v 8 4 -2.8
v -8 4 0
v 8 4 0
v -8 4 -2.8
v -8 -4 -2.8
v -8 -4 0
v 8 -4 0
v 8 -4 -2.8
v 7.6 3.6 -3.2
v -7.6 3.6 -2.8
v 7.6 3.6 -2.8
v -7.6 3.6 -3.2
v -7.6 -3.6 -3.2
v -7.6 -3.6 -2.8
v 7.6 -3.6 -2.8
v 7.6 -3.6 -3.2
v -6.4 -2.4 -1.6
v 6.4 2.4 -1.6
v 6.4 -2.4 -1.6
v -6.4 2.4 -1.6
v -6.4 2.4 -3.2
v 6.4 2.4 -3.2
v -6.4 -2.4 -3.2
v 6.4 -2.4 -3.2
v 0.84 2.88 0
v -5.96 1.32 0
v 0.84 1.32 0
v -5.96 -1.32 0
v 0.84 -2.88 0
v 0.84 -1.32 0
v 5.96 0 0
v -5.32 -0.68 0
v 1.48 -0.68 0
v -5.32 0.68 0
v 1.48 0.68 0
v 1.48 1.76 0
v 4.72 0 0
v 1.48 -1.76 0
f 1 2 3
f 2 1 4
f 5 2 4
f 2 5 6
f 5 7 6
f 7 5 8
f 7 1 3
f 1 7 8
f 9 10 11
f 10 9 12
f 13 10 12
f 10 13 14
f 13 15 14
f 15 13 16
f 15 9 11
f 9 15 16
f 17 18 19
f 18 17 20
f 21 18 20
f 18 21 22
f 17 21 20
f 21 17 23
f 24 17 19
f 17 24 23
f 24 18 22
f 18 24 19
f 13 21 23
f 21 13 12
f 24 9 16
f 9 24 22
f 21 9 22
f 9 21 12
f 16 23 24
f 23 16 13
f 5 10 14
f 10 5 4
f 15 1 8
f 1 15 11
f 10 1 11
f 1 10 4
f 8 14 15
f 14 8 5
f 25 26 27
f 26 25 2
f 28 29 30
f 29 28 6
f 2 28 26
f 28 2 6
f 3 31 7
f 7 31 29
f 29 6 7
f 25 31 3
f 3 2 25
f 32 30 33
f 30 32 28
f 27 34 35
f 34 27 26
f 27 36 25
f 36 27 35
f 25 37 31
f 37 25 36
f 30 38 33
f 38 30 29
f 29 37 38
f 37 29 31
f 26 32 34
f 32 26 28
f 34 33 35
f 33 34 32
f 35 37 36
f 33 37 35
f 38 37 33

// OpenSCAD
// file: ../p/box5.scad
use <../lib.scad>
function ldraw_lib__box5() = [
// 0 Box with 5 Faces and All Edges
// 0 Name: box5.dat
// 0 Author: James Jessiman
// 0 !LDRAW_ORG Primitive UPDATE 2012-01
// 0 !LICENSE Licensed under CC BY 4.0 : see CAreadme.txt
// 
// 0 BFC CERTIFY CCW
  [0,"BFC","CERTIFY"],
  [0,"BFC","CCW"],
// 
// 0 !HISTORY 2002-04-03 [sbliss] Modified for BFC compliance
// 0 !HISTORY 2002-04-25 [PTadmin] Official Update 2002-02
// 0 !HISTORY 2007-06-24 [PTadmin] Header formatted for Contributor Agreement
// 0 !HISTORY 2008-07-01 [PTadmin] Official Update 2008-01
// 0 !HISTORY 2012-02-16 [Philo] Changed to CCW
// 0 !HISTORY 2012-03-30 [PTadmin] Official Update 2012-01
// 
// 
// 2 24 1 1 1 -1 1 1
  [2,24,1,1,1,-1,1,1],
// 2 24 -1 1 1 -1 1 -1
  [2,24,-1,1,1,-1,1,-1],
// 2 24 -1 1 -1 1 1 -1
  [2,24,-1,1,-1,1,1,-1],
// 2 24 1 1 -1 1 1 1
  [2,24,1,1,-1,1,1,1],
// 2 24 1 0 1 -1 0 1
  [2,24,1,0,1,-1,0,1],
// 2 24 -1 0 1 -1 0 -1
  [2,24,-1,0,1,-1,0,-1],
// 2 24 -1 0 -1 1 0 -1
  [2,24,-1,0,-1,1,0,-1],
// 2 24 1 0 -1 1 0 1
  [2,24,1,0,-1,1,0,1],
// 2 24 1 0 1 1 1 1
  [2,24,1,0,1,1,1,1],
// 2 24 -1 0 1 -1 1 1
  [2,24,-1,0,1,-1,1,1],
// 2 24 1 0 -1 1 1 -1
  [2,24,1,0,-1,1,1,-1],
// 2 24 -1 0 -1 -1 1 -1
  [2,24,-1,0,-1,-1,1,-1],
// 4 16 -1 1 1 1 1 1 1 1 -1 -1 1 -1
  [4,16,-1,1,1,1,1,1,1,1,-1,-1,1,-1],
// 4 16 -1 1 1 -1 0 1 1 0 1 1 1 1
  [4,16,-1,1,1,-1,0,1,1,0,1,1,1,1],
// 4 16 -1 1 -1 -1 0 -1 -1 0 1 -1 1 1
  [4,16,-1,1,-1,-1,0,-1,-1,0,1,-1,1,1],
// 4 16 1 1 -1 1 0 -1 -1 0 -1 -1 1 -1
  [4,16,1,1,-1,1,0,-1,-1,0,-1,-1,1,-1],
// 4 16 1 1 1 1 0 1 1 0 -1 1 1 -1
  [4,16,1,1,1,1,0,1,1,0,-1,1,1,-1],
];
module ldraw_lib__box5(step=0, col=false, unit=2/5, alt=false, line=0.2, solid=!$preview)
    makepoly(ldraw_lib__box5(), step=step, col=col, unit=unit, alt=alt, line=line, solid=solid);
ldraw_lib__box5(line=0.2);
// file: ../p/box4.scad
use <../lib.scad>
function ldraw_lib__box4() = [
// 0 Box with 4 Faces (2 Parallel Pairs) and All Edges
// 0 Name: box4.dat
// 0 Author: James Jessiman
// 0 !LDRAW_ORG Primitive UPDATE 2012-01
// 0 !LICENSE Licensed under CC BY 4.0 : see CAreadme.txt
// 
// 0 BFC CERTIFY CCW
  [0,"BFC","CERTIFY"],
  [0,"BFC","CCW"],
// 
// 0 !HISTORY 2002-04-03 [sbliss] Modified for BFC compliance
// 0 !HISTORY 2002-04-25 [PTadmin] Official Update 2002-02
// 0 !HISTORY 2007-06-24 [PTadmin] Header formatted for Contributor Agreement
// 0 !HISTORY 2008-07-01 [PTadmin] Official Update 2008-01
// 0 !HISTORY 2012-02-16 [Philo] Changed to CCW
// 0 !HISTORY 2012-03-30 [PTadmin] Official Update 2012-01
// 
// 
// 2 24 1 1 1 -1 1 1
  [2,24,1,1,1,-1,1,1],
// 2 24 -1 1 1 -1 1 -1
  [2,24,-1,1,1,-1,1,-1],
// 2 24 -1 1 -1 1 1 -1
  [2,24,-1,1,-1,1,1,-1],
// 2 24 1 1 -1 1 1 1
  [2,24,1,1,-1,1,1,1],
// 2 24 1 0 1 -1 0 1
  [2,24,1,0,1,-1,0,1],
// 2 24 -1 0 1 -1 0 -1
  [2,24,-1,0,1,-1,0,-1],
// 2 24 -1 0 -1 1 0 -1
  [2,24,-1,0,-1,1,0,-1],
// 2 24 1 0 -1 1 0 1
  [2,24,1,0,-1,1,0,1],
// 2 24 1 0 1 1 1 1
  [2,24,1,0,1,1,1,1],
// 2 24 -1 0 1 -1 1 1
  [2,24,-1,0,1,-1,1,1],
// 2 24 1 0 -1 1 1 -1
  [2,24,1,0,-1,1,1,-1],
// 2 24 -1 0 -1 -1 1 -1
  [2,24,-1,0,-1,-1,1,-1],
// 4 16 -1 1 1 -1 0 1 1 0 1 1 1 1
  [4,16,-1,1,1,-1,0,1,1,0,1,1,1,1],
// 4 16 -1 1 -1 -1 0 -1 -1 0 1 -1 1 1
  [4,16,-1,1,-1,-1,0,-1,-1,0,1,-1,1,1],
// 4 16 1 1 -1 1 0 -1 -1 0 -1 -1 1 -1
  [4,16,1,1,-1,1,0,-1,-1,0,-1,-1,1,-1],
// 4 16 1 1 1 1 0 1 1 0 -1 1 1 -1
  [4,16,1,1,1,1,0,1,1,0,-1,1,1,-1],
];
module ldraw_lib__box4(step=0, col=false, unit=2/5, alt=false, line=0.2, solid=!$preview)
    makepoly(ldraw_lib__box4(), step=step, col=col, unit=unit, alt=alt, line=line, solid=solid);
ldraw_lib__box4(line=0.2);
// file: s/3069p06c.scad
use <../../lib.scad>
function ldraw_lib__s__3069p06c() = [
// 0 ~Tile  1 x  2 with Arrow Long Pattern (Arrow)
// 0 Name: s\3069p06c.dat
// 0 Author: William Howard [WilliamH]
// 0 !LDRAW_ORG Subpart UPDATE 2009-03
// 0 !LICENSE Licensed under CC BY 2.0 and CC BY 4.0 : see CAreadme.txt
// 
// 0 BFC CERTIFY CCW
  [0,"BFC","CERTIFY"],
  [0,"BFC","CCW"],
// 
// 0 !HISTORY 2009-05-02 [PTadmin] Official Update 2009-01
// 0 !HISTORY 2009-08-18 [anathema] Improved pattern
// 0 !HISTORY 2009-12-29 [PTadmin] Official Update 2009-03
// 
// 
// 4 16 -13.3 0 -1.7 3.7 0 -1.7 3.7 0 1.7 -13.3 0 1.7
  [4,16,-13.3,0,-1.7,3.7,0,-1.7,3.7,0,1.7,-13.3,0,1.7],
// 3 16 3.7 0 1.7 11.8 0 0 3.7 0 4.4
  [3,16,3.7,0,1.7,11.8,0,0,3.7,0,4.4],
// 3 16 3.7 0 -1.7 11.8 0 0 3.7 0 1.7
  [3,16,3.7,0,-1.7,11.8,0,0,3.7,0,1.7],
// 3 16 3.7 0 -4.4 11.8 0 0 3.7 0 -1.7
  [3,16,3.7,0,-4.4,11.8,0,0,3.7,0,-1.7],
// 0
];
module ldraw_lib__s__3069p06c(step=0, col=false, unit=2/5, alt=false, line=0.2, solid=!$preview)
    makepoly(ldraw_lib__s__3069p06c(), step=step, col=col, unit=unit, alt=alt, line=line, solid=solid);
ldraw_lib__s__3069p06c(line=0.2);
// file: s/3069p06b.scad
use <../../lib.scad>
function ldraw_lib__s__3069p06b() = [
// 0 ~Tile  1 x  2 with Arrow Long Pattern (Border)
// 0 Name: s\3069p06b.dat
// 0 Author: William Howard [WilliamH]
// 0 !LDRAW_ORG Subpart UPDATE 2009-03
// 0 !LICENSE Licensed under CC BY 2.0 and CC BY 4.0 : see CAreadme.txt
// 
// 0 BFC CERTIFY CCW
  [0,"BFC","CERTIFY"],
  [0,"BFC","CCW"],
// 
// 0 !HISTORY 2009-05-02 [PTadmin] Official Update 2009-01
// 0 !HISTORY 2009-08-18 [anathema] Improved pattern
// 0 !HISTORY 2009-10-09 [cwdee] Corrected small overlap
// 0 !HISTORY 2009-12-29 [PTadmin] Official Update 2009-03
// 
// 
// 4 16 -14.9 0 -3.3 2.1 0 -3.3 3.7 0 -1.7 -13.3 0 -1.7
  [4,16,-14.9,0,-3.3,2.1,0,-3.3,3.7,0,-1.7,-13.3,0,-1.7],
// 4 16 -13.3 0 1.7 3.7 0 1.7 2.1 0 3.3 -14.9 0 3.3
  [4,16,-13.3,0,1.7,3.7,0,1.7,2.1,0,3.3,-14.9,0,3.3],
// 4 16 2.1 0 7.2 2.1 0 3.3 3.7 0 1.7 3.7 0 4.4
  [4,16,2.1,0,7.2,2.1,0,3.3,3.7,0,1.7,3.7,0,4.4],
// 4 16 3.7 0 4.4 11.8 0 0 14.9 0 0 2.1 0 7.2
  [4,16,3.7,0,4.4,11.8,0,0,14.9,0,0,2.1,0,7.2],
// 4 16 3.7 0 -4.4 3.7 0 -1.7 2.1 0 -3.3 2.1 0 -7.2
  [4,16,3.7,0,-4.4,3.7,0,-1.7,2.1,0,-3.3,2.1,0,-7.2],
// 4 16 2.1 0 -7.2 14.9 0 0 11.8 0 0 3.7 0 -4.4
  [4,16,2.1,0,-7.2,14.9,0,0,11.8,0,0,3.7,0,-4.4],
// 4 16 -14.9 0 3.3 -14.9 0 -3.3 -13.3 0 -1.7 -13.3 0 1.7
  [4,16,-14.9,0,3.3,-14.9,0,-3.3,-13.3,0,-1.7,-13.3,0,1.7],
// 0
];
module ldraw_lib__s__3069p06b(step=0, col=false, unit=2/5, alt=false, line=0.2, solid=!$preview)
    makepoly(ldraw_lib__s__3069p06b(), step=step, col=col, unit=unit, alt=alt, line=line, solid=solid);
ldraw_lib__s__3069p06b(line=0.2);
// file: s/3069p06a.scad
use <../../lib.scad>
function ldraw_lib__s__3069p06a() = [
// 0 ~Tile  1 x  2 with Arrow Long Pattern (Mask)
// 0 Name: s\3069p06a.dat
// 0 Author: William Howard [WilliamH]
// 0 !LDRAW_ORG Subpart UPDATE 2009-03
// 0 !LICENSE Licensed under CC BY 2.0 and CC BY 4.0 : see CAreadme.txt
// 
// 0 BFC CERTIFY CCW
  [0,"BFC","CERTIFY"],
  [0,"BFC","CCW"],
// 
// 0 !HISTORY 2009-05-02 [PTadmin] Official Update 2009-01
// 0 !HISTORY 2009-08-18 [anathema] Improved pattern
// 0 !HISTORY 2009-12-29 [PTadmin] Official Update 2009-03
// 
// 
// 4 16 -14.9 0 3.3 2.1 0 3.3 2.1 0 7.2 -20 0 10
  [4,16,-14.9,0,3.3,2.1,0,3.3,2.1,0,7.2,-20,0,10],
// 4 16 -20 0 -10 2.1 0 -7.2 2.1 0 -3.3 -14.9 0 -3.3
  [4,16,-20,0,-10,2.1,0,-7.2,2.1,0,-3.3,-14.9,0,-3.3],
// 4 16 -20 0 10 -20 0 -10 -14.9 0 -3.3 -14.9 0 3.3
  [4,16,-20,0,10,-20,0,-10,-14.9,0,-3.3,-14.9,0,3.3],
// 3 16 20 0 10 14.9 0 0 20 0 -10
  [3,16,20,0,10,14.9,0,0,20,0,-10],
// 3 16 20 0 -10 14.9 0 0 2.1 0 -7.2
  [3,16,20,0,-10,14.9,0,0,2.1,0,-7.2],
// 3 16 2.1 0 -7.2 -20 0 -10 20 0 -10
  [3,16,2.1,0,-7.2,-20,0,-10,20,0,-10],
// 3 16 2.1 0 7.2 14.9 0 0 20 0 10
  [3,16,2.1,0,7.2,14.9,0,0,20,0,10],
// 3 16 20 0 10 -20 0 10 2.1 0 7.2
  [3,16,20,0,10,-20,0,10,2.1,0,7.2],
// 0
];
module ldraw_lib__s__3069p06a(step=0, col=false, unit=2/5, alt=false, line=0.2, solid=!$preview)
    makepoly(ldraw_lib__s__3069p06a(), step=step, col=col, unit=unit, alt=alt, line=line, solid=solid);
ldraw_lib__s__3069p06a(line=0.2);
// file: s/3069bs01.scad
use <../../lib.scad>
use <../../p/box4.scad>
use <../../p/box5.scad>
function ldraw_lib__s__3069bs01() = [
// 0 ~Tile  1 x  2 with Groove without Top Face
// 0 Name: s\3069bs01.dat
// 0 Author: Santeri Piippo [arezey]
// 0 !LDRAW_ORG Subpart UPDATE 2010-02
// 0 !LICENSE Licensed under CC BY 4.0 : see CAreadme.txt
// 
// 0 BFC CERTIFY CCW
  [0,"BFC","CERTIFY"],
  [0,"BFC","CCW"],
// 
// 0 !HISTORY 2010-07-05 [PTadmin] Official Update 2010-02
// 
// 
// 1 16 0 0 0 20 0 0 0 7 0 0 0 10 box4.dat
  [1,16,0,0,0,20,0,0,0,7,0,0,0,10, ldraw_lib__box4()],
// 1 16 0 7 0 19 0 0 0 1 0 0 0 9 box4.dat
  [1,16,0,7,0,19,0,0,0,1,0,0,0,9, ldraw_lib__box4()],
// 0 BFC INVERTNEXT
  [0,"BFC","INVERTNEXT"],
// 1 16 0 8 0 16 0 0 0 -4 0 0 0 6 box5.dat
  [1,16,0,8,0,16,0,0,0,-4,0,0,0,6, ldraw_lib__box5()],
// 4 16 -19 8 9 -16 8 6 -16 8 -6 -19 8 -9
  [4,16,-19,8,9,-16,8,6,-16,8,-6,-19,8,-9],
// 4 16 19 8 -9 16 8 -6 16 8 6 19 8 9
  [4,16,19,8,-9,16,8,-6,16,8,6,19,8,9],
// 4 16 19 8 9 16 8 6 -16 8 6 -19 8 9
  [4,16,19,8,9,16,8,6,-16,8,6,-19,8,9],
// 4 16 -19 8 -9 -16 8 -6 16 8 -6 19 8 -9
  [4,16,-19,8,-9,-16,8,-6,16,8,-6,19,8,-9],
// 4 16 -20 7 10 -19 7 9 -19 7 -9 -20 7 -10
  [4,16,-20,7,10,-19,7,9,-19,7,-9,-20,7,-10],
// 4 16 20 7 -10 19 7 -9 19 7 9 20 7 10
  [4,16,20,7,-10,19,7,-9,19,7,9,20,7,10],
// 4 16 20 7 10 19 7 9 -19 7 9 -20 7 10
  [4,16,20,7,10,19,7,9,-19,7,9,-20,7,10],
// 4 16 -20 7 -10 -19 7 -9 19 7 -9 20 7 -10
  [4,16,-20,7,-10,-19,7,-9,19,7,-9,20,7,-10],
// 0 //
];
module ldraw_lib__s__3069bs01(step=0, col=false, unit=2/5, alt=false, line=0.2, solid=!$preview)
    makepoly(ldraw_lib__s__3069bs01(), step=step, col=col, unit=unit, alt=alt, line=line, solid=solid);
ldraw_lib__s__3069bs01(line=0.2);
// main file
use <../lib.scad>
use <s/3069bs01.scad>
use <s/3069p06a.scad>
use <s/3069p06b.scad>
use <s/3069p06c.scad>
function ldraw_lib__3069bp12() = [
// 0 Tile  1 x  2 with Arrow Long Black Pattern
// 0 Name: 3069bp12.dat
// 0 Author: James Jessiman
// 0 !LDRAW_ORG Part UPDATE 2009-03
// 0 !LICENSE Licensed under CC BY 4.0 : see CAreadme.txt
// 
// 0 BFC CERTIFY CCW
  [0,"BFC","CERTIFY"],
  [0,"BFC","CCW"],
// 
// 0 !HISTORY 2007-06-13 [PTadmin] Header formatted for Contributor Agreement
// 0 !HISTORY 2008-07-01 [PTadmin] Official Update 2008-01
// 0 !HISTORY 2009-07-16 [PTadmin] Renamed from 3069p12
// 0 !HISTORY 2009-07-16 [arezey] BFC'd
// 0 !HISTORY 2009-08-19 [anathema] Rewrote using subparts
// 0 !HISTORY 2009-12-29 [PTadmin] Official Update 2009-03
// 
// 
// 1 16 0 0 0 1 0 0 0 1 0 0 0 1 s\3069bs01.dat
  [1,16,0,0,0,1,0,0,0,1,0,0,0,1, ldraw_lib__s__3069bs01()],
// 1 16 0 0 0 1 0 0 0 1 0 0 0 1 s\3069p06a.dat
  [1,16,0,0,0,1,0,0,0,1,0,0,0,1, ldraw_lib__s__3069p06a()],
// 1 0 0 0 0 1 0 0 0 1 0 0 0 1 s\3069p06b.dat
  [1,0,0,0,0,1,0,0,0,1,0,0,0,1, ldraw_lib__s__3069p06b()],
// 1 0 0 0 0 1 0 0 0 1 0 0 0 1 s\3069p06c.dat
  [1,0,0,0,0,1,0,0,0,1,0,0,0,1, ldraw_lib__s__3069p06c()],
// 0
];
module ldraw_lib__3069bp12(step=0, col=false, unit=2/5, alt=false, line=0.2, solid=!$preview)
    makepoly(ldraw_lib__3069bp12(), step=step, col=col, unit=unit, alt=alt, line=line, solid=solid);
ldraw_lib__3069bp12(line=0.2);
